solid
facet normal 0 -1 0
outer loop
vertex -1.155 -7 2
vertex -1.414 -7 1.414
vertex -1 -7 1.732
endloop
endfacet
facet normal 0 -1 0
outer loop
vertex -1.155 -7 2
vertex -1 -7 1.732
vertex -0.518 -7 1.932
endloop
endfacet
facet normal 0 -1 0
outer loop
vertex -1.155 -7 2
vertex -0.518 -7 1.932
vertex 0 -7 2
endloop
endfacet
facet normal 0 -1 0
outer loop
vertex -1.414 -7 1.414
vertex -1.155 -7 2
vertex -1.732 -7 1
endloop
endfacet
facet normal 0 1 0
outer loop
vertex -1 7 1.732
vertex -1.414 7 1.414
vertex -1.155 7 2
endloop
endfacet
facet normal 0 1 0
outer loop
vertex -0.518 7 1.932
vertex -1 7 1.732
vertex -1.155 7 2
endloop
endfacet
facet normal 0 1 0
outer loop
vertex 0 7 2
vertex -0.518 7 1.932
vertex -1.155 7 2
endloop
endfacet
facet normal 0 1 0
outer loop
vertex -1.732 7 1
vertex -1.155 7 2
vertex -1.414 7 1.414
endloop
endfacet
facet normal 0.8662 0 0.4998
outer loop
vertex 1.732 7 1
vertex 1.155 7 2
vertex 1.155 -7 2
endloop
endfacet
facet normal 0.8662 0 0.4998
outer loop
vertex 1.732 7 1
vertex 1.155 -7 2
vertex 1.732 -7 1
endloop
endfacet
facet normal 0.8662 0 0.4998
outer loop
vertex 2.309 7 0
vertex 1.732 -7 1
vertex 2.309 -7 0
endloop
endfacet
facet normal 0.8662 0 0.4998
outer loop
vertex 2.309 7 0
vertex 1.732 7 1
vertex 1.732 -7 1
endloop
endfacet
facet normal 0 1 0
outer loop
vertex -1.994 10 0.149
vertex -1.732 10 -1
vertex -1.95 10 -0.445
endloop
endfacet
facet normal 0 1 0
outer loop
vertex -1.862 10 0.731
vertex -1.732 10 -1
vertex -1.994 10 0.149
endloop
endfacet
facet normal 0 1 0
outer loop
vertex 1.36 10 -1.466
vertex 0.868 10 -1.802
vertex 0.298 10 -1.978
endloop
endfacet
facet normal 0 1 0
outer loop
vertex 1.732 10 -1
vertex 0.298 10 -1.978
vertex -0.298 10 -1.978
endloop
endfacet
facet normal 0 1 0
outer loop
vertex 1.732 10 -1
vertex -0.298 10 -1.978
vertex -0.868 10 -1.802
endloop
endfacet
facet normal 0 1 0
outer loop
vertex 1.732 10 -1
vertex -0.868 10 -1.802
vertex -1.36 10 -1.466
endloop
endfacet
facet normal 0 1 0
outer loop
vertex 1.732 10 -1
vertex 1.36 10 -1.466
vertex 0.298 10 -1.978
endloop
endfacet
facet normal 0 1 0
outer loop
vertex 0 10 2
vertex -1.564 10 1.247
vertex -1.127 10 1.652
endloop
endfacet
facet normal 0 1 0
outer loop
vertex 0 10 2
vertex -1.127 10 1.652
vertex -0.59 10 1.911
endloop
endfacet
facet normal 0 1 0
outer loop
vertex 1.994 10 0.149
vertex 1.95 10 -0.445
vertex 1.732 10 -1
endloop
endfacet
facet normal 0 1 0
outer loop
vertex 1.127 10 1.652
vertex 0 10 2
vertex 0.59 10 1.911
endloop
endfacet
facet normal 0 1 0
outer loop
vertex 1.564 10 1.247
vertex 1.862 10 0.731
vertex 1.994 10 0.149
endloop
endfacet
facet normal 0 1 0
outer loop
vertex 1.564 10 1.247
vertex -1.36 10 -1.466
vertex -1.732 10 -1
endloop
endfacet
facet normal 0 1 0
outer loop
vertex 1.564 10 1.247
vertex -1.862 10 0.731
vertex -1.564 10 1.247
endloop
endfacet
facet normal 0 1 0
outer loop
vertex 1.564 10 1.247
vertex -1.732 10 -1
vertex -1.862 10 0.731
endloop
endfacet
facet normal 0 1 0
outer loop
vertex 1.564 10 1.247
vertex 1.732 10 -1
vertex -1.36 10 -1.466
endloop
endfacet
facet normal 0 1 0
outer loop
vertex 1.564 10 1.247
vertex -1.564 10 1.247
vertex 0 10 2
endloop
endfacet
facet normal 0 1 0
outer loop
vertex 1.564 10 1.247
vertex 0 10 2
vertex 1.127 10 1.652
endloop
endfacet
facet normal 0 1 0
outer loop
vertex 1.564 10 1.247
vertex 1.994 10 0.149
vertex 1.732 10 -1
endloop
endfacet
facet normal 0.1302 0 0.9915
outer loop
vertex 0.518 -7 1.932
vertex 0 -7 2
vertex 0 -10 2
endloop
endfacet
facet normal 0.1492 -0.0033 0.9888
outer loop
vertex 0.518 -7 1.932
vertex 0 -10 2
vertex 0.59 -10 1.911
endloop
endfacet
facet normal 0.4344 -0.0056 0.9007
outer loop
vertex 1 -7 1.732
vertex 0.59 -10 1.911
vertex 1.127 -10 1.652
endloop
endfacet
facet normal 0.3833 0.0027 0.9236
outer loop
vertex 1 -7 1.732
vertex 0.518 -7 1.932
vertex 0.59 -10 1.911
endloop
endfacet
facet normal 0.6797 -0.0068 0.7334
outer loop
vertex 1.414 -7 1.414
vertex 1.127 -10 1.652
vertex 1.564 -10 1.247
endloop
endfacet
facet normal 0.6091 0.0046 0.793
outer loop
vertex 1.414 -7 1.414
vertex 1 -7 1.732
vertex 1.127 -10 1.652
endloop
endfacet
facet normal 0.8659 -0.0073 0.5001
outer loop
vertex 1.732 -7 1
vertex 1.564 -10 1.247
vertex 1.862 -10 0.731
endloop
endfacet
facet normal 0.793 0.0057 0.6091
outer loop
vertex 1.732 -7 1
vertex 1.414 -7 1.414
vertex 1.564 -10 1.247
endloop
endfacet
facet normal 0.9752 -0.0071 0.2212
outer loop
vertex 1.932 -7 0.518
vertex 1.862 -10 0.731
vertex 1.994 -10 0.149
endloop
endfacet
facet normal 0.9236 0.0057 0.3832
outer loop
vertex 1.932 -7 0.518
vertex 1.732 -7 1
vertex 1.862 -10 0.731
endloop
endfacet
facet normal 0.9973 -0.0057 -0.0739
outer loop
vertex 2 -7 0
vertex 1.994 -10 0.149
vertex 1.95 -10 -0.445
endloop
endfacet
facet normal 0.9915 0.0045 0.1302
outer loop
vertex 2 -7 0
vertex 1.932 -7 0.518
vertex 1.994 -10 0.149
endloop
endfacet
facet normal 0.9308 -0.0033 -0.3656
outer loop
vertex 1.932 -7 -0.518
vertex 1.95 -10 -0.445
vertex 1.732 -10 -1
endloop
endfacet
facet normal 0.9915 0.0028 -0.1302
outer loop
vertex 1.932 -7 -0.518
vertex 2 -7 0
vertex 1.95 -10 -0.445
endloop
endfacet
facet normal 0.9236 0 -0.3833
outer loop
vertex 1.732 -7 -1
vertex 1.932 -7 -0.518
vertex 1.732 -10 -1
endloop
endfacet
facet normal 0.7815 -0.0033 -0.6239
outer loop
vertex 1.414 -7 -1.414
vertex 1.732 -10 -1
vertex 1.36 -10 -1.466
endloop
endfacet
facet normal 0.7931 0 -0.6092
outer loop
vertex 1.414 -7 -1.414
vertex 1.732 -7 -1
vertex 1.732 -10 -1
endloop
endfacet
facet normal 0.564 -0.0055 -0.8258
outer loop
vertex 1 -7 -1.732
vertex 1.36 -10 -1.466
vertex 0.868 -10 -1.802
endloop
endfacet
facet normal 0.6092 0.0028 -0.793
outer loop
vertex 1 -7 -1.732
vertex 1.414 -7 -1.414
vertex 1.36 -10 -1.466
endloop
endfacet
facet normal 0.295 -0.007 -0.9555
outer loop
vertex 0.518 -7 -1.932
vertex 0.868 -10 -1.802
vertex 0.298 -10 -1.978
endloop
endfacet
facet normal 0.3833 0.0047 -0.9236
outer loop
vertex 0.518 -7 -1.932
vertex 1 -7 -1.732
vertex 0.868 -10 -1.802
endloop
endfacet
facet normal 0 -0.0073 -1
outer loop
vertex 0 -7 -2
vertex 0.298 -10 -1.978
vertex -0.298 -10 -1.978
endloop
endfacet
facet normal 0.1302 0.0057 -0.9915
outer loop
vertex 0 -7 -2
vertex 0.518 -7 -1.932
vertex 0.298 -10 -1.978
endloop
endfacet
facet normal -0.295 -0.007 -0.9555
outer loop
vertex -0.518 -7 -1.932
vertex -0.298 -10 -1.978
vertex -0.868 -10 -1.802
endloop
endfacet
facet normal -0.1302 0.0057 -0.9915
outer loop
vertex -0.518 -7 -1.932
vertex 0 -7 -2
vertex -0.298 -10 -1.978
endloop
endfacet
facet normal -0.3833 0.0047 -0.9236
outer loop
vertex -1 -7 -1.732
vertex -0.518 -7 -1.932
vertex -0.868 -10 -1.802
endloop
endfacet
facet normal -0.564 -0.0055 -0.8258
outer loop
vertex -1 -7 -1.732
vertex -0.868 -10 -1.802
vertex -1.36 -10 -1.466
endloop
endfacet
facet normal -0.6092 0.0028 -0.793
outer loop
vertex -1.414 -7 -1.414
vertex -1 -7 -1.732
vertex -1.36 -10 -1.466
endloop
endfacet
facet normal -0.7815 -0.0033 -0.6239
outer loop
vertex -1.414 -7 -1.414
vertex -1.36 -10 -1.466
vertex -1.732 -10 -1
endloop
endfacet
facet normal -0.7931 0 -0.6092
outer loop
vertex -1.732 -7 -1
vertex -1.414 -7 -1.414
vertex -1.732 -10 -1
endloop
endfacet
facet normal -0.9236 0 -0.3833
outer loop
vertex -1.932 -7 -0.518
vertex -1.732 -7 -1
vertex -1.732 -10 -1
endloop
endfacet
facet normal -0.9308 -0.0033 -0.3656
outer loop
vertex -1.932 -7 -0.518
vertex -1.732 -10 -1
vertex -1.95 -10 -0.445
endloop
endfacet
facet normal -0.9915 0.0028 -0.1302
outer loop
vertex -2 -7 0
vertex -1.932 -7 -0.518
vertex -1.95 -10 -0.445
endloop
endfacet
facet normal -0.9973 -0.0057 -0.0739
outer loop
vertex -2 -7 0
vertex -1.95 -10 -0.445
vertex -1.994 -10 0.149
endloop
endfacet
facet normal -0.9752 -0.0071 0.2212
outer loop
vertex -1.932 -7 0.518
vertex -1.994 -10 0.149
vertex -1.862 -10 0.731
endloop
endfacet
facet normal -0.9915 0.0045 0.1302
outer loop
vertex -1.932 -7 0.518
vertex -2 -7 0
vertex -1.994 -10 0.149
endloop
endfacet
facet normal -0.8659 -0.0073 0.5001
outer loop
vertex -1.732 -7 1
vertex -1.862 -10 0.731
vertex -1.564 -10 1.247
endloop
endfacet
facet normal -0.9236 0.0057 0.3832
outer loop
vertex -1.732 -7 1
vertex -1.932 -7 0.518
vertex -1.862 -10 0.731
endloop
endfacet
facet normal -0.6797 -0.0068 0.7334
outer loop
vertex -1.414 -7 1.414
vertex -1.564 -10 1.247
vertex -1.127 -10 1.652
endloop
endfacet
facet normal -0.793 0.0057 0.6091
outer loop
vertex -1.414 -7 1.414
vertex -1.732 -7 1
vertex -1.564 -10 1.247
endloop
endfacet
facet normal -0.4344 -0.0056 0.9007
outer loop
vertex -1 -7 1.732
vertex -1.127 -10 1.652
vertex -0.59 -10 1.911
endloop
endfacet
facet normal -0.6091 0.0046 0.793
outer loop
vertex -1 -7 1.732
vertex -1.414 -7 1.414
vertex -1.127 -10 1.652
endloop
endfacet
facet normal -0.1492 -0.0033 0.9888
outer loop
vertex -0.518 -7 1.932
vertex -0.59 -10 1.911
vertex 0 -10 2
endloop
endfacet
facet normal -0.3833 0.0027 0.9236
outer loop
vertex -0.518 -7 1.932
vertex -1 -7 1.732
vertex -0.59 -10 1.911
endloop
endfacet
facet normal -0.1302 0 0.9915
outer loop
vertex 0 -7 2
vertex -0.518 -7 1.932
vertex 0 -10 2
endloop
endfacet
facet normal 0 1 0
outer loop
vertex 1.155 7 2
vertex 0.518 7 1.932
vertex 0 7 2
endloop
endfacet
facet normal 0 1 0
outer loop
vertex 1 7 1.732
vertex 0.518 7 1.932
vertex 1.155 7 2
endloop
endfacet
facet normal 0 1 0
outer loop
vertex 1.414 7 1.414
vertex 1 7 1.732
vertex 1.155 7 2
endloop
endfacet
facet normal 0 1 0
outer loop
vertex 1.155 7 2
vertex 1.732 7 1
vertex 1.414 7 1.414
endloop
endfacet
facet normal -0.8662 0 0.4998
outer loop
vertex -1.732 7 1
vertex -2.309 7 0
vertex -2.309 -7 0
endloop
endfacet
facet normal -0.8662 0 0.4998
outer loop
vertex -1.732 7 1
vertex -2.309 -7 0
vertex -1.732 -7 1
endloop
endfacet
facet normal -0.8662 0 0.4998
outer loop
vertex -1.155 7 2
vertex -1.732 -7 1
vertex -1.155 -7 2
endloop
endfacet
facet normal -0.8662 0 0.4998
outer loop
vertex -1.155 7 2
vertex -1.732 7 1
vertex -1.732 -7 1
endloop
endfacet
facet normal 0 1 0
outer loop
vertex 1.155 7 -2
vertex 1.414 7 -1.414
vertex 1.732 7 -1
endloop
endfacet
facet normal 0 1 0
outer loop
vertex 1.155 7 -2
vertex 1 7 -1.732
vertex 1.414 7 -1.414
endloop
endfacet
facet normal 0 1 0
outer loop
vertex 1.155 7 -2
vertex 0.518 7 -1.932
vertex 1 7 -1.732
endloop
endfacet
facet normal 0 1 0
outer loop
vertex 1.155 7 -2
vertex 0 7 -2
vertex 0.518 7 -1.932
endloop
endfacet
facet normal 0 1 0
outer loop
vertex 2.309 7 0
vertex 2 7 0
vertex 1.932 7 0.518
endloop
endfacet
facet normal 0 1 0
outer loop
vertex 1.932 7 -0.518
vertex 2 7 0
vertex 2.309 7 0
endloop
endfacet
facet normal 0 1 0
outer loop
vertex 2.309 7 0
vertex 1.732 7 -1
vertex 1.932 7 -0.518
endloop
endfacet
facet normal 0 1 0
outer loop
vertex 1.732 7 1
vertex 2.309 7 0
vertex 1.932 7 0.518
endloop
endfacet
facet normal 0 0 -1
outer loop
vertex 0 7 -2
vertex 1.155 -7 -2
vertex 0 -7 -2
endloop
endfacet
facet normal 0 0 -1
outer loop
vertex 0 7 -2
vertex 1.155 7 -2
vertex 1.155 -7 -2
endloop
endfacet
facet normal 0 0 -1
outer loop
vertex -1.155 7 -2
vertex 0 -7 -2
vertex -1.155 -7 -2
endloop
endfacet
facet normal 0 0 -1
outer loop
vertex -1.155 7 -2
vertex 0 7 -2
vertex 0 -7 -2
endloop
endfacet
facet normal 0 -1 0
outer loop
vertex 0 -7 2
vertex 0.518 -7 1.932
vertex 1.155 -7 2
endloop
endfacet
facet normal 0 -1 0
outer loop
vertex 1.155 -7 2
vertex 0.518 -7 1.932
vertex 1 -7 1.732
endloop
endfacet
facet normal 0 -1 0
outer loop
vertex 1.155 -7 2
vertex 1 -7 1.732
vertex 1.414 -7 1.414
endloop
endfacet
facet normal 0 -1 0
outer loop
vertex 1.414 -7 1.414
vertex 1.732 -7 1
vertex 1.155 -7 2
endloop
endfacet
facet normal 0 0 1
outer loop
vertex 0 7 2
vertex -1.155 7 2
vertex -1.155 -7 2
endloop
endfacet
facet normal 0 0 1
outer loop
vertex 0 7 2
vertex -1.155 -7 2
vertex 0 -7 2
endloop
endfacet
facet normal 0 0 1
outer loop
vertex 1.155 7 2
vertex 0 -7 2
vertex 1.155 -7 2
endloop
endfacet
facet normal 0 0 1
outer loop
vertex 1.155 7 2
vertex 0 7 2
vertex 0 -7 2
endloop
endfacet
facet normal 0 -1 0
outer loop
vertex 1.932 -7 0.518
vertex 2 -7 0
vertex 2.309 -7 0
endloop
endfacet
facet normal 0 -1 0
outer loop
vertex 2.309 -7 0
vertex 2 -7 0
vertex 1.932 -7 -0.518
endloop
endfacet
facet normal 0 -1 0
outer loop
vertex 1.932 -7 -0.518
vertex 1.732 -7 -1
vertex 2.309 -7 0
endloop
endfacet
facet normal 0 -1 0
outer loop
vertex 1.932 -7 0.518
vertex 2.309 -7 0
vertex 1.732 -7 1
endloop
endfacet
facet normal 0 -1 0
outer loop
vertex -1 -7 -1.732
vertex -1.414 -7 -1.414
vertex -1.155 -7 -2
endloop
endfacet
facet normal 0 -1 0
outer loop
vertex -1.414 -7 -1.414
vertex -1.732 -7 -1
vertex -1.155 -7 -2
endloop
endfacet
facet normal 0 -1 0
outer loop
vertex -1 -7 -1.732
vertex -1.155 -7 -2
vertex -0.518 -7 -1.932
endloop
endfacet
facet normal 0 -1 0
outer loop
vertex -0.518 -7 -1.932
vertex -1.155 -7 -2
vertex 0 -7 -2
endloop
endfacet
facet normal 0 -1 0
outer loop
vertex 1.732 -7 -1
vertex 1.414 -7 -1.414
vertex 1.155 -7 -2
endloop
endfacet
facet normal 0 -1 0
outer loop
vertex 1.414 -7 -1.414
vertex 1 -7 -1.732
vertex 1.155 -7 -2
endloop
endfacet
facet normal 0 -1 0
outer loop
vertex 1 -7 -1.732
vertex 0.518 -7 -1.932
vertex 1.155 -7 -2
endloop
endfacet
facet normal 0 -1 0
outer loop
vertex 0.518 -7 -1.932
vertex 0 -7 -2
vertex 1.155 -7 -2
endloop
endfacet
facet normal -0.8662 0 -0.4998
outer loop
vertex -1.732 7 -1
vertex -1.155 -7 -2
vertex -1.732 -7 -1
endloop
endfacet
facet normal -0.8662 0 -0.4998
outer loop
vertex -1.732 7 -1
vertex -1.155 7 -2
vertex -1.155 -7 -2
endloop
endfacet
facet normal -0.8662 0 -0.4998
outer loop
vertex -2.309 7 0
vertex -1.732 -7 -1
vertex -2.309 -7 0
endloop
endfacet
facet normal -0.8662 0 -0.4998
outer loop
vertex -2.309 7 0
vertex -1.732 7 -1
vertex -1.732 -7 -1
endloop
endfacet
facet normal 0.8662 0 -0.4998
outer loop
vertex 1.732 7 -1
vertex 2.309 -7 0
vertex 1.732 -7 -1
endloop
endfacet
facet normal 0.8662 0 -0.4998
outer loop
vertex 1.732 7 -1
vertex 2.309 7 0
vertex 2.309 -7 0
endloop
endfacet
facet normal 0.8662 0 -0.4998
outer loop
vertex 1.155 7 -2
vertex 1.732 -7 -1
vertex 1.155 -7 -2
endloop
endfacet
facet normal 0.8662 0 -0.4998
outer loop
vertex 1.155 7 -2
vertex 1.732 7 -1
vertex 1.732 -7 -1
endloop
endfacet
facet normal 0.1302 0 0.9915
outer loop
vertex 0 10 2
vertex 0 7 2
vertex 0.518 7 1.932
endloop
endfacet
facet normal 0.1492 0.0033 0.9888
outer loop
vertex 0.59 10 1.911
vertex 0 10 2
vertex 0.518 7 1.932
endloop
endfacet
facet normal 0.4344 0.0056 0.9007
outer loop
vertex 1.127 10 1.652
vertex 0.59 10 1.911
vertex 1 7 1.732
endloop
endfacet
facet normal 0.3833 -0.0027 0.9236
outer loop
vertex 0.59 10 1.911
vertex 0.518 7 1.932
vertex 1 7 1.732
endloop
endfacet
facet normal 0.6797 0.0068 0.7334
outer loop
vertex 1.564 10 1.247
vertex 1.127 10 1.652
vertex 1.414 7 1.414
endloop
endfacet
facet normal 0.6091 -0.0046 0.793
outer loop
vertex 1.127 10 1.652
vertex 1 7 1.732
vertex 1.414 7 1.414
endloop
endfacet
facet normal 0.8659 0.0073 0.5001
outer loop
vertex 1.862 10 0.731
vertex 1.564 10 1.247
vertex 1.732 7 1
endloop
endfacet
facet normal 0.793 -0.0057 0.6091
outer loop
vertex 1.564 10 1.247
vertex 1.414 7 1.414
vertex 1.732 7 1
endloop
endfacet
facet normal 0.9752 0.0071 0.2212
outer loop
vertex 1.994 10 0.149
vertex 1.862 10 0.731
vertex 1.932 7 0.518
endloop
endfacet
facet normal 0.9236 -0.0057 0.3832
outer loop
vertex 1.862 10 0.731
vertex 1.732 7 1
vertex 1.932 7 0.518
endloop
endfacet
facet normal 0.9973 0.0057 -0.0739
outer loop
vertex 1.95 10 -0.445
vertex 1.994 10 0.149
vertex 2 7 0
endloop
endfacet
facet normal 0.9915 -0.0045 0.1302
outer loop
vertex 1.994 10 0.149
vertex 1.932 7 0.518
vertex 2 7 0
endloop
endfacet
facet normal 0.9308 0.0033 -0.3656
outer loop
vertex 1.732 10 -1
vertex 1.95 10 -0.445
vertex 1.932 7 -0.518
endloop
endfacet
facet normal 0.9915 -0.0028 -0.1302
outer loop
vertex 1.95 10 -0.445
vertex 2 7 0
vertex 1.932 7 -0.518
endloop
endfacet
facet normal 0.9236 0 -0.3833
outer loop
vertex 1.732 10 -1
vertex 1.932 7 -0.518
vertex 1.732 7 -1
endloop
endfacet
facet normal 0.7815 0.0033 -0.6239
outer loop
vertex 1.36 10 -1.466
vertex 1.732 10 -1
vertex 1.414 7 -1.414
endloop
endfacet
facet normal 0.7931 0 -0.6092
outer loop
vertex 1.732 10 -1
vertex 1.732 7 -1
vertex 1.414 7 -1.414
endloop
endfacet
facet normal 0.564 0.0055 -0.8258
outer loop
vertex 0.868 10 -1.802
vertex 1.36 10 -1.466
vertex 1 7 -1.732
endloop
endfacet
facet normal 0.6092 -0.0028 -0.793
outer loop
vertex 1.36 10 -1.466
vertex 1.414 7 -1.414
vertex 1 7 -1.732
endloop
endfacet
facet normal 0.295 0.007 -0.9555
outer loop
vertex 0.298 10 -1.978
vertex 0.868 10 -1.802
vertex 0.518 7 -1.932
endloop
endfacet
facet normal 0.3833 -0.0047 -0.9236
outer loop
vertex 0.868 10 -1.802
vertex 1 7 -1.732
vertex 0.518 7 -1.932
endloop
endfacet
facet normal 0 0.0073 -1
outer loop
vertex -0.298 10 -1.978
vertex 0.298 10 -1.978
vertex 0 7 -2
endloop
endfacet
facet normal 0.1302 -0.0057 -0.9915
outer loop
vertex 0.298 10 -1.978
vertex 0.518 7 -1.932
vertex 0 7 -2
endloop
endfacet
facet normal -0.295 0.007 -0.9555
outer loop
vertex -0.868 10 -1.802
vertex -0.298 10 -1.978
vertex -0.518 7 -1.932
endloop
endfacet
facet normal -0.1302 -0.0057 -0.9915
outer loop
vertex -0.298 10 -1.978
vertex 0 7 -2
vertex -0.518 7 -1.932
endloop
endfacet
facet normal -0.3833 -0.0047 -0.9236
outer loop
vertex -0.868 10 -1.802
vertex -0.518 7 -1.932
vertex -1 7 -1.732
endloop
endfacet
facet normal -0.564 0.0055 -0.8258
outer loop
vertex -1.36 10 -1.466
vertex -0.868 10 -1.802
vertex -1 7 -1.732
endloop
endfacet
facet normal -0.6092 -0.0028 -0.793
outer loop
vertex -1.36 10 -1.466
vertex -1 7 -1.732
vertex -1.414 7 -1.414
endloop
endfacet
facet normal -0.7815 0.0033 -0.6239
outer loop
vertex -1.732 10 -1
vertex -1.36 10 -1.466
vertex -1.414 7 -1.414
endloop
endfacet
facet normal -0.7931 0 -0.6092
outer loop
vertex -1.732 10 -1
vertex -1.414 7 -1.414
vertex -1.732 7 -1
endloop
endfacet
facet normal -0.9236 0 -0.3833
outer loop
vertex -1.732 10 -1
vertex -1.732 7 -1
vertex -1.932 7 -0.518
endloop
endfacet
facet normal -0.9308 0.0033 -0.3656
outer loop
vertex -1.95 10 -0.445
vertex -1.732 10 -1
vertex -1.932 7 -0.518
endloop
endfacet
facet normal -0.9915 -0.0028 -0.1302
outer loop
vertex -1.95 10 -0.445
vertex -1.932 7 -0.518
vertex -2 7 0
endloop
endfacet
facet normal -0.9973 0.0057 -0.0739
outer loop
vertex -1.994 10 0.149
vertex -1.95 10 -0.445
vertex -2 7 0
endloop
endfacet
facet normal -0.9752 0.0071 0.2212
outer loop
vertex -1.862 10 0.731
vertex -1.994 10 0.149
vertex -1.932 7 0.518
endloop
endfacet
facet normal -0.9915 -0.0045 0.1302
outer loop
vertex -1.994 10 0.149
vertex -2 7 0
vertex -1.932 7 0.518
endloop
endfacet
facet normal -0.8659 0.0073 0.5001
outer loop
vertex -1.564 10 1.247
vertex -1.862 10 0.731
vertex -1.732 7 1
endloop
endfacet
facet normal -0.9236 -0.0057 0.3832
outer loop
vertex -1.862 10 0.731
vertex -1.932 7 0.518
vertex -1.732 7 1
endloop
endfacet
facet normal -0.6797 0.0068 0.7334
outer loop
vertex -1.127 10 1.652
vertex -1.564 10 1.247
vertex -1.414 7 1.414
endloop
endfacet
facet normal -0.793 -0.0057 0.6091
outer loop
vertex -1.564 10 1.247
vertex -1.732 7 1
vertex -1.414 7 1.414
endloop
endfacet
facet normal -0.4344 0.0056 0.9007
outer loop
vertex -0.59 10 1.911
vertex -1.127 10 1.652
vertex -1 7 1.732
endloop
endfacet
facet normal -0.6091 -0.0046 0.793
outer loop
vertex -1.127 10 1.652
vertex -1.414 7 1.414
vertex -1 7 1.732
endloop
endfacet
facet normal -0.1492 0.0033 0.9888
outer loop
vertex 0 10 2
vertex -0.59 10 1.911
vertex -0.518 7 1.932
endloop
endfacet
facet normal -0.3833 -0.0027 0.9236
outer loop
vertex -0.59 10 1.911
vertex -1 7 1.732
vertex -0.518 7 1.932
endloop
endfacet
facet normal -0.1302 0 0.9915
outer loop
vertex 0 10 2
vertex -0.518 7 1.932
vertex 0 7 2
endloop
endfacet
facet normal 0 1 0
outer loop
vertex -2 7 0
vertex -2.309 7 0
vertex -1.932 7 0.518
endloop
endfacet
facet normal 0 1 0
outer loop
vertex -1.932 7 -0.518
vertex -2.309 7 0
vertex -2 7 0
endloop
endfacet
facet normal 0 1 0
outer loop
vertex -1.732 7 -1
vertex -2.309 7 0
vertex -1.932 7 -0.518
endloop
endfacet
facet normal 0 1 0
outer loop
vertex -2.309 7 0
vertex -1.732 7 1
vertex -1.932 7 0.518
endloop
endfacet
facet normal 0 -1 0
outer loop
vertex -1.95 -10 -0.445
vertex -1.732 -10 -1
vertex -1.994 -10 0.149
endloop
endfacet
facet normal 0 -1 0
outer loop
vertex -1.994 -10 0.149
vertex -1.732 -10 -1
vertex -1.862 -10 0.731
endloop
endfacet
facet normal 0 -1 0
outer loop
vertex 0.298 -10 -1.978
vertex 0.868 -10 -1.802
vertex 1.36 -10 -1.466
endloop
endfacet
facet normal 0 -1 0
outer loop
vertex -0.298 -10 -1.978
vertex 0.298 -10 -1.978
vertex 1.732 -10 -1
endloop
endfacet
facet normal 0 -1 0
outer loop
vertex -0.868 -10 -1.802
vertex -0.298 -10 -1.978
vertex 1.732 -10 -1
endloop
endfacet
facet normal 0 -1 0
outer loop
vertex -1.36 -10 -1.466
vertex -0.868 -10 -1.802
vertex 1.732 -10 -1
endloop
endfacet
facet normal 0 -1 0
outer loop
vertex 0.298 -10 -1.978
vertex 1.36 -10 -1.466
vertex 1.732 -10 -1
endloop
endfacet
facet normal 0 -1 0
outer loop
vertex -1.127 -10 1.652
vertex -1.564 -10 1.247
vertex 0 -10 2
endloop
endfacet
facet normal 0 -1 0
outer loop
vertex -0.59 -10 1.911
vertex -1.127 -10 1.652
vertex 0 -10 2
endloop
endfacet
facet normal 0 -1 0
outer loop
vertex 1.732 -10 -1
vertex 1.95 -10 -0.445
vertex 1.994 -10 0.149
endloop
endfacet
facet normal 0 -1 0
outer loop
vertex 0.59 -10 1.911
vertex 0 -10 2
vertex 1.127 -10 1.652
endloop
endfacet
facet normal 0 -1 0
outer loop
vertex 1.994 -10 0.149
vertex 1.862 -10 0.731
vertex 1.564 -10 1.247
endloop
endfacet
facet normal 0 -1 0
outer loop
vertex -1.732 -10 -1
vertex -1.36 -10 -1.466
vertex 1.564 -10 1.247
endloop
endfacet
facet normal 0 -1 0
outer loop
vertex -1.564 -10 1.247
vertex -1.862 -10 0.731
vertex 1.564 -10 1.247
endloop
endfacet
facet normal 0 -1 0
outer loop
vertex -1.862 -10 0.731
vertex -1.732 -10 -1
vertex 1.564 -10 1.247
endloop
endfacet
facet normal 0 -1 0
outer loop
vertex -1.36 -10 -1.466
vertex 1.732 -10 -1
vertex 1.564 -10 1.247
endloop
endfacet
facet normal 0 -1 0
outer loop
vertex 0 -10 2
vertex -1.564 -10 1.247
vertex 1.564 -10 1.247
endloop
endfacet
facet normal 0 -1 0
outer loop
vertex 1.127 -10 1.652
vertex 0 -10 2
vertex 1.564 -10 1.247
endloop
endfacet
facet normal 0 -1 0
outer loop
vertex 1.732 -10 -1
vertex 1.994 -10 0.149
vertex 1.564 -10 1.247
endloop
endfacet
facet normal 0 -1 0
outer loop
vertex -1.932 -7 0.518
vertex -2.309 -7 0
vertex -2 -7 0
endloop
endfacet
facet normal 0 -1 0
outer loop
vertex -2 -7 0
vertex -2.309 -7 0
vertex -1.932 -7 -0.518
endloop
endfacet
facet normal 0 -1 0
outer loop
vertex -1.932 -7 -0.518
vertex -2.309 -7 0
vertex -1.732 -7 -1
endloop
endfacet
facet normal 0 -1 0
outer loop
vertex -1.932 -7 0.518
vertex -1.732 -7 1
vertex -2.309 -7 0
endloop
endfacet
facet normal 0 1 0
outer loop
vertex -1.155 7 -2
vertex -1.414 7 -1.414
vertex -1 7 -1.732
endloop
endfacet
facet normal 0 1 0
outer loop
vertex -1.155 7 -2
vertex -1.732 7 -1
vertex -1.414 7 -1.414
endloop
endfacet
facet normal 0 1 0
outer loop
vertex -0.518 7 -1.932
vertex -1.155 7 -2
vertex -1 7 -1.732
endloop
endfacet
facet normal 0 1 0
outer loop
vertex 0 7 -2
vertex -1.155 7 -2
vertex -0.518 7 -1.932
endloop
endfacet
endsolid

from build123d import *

# Parameters (mm, degrees)
BOSS_EXTRUDE1_DEPTH = 7
SKETCH2_R           = 2
BOSS_EXTRUDE2_DEPTH = 3


with BuildPart() as part:
    # Sketch1 → Boss-Extrude1 (new, symmetric)
    with BuildSketch(Plane(origin=(0, 0, 0), x_dir=(1, 0, 0), z_dir=(0, 1, 0))):
        Polygon((-1.154700538, 2), (-2.309401077, 0), (-1.154700538, -2), (1.154700538, -2), (2.309401077, 0), (1.154700538, 2), align=None)
    extrude(amount=BOSS_EXTRUDE1_DEPTH, both=True)

    # Sketch2 → Boss-Extrude2 (add)
    with BuildSketch(Plane(origin=(0, 7, 0), x_dir=(1, 0, 0), z_dir=(0, 1, 0))):
        with Locations(Location((0, 0, 0), (0, 0, 270))):
            Circle(SKETCH2_R)
    boss_extrude2 = extrude(amount=BOSS_EXTRUDE2_DEPTH)

    # Mirror1: Boss-Extrude2 across plane
    add(boss_extrude2.mirror(Plane.ZX))


solid = part.part
